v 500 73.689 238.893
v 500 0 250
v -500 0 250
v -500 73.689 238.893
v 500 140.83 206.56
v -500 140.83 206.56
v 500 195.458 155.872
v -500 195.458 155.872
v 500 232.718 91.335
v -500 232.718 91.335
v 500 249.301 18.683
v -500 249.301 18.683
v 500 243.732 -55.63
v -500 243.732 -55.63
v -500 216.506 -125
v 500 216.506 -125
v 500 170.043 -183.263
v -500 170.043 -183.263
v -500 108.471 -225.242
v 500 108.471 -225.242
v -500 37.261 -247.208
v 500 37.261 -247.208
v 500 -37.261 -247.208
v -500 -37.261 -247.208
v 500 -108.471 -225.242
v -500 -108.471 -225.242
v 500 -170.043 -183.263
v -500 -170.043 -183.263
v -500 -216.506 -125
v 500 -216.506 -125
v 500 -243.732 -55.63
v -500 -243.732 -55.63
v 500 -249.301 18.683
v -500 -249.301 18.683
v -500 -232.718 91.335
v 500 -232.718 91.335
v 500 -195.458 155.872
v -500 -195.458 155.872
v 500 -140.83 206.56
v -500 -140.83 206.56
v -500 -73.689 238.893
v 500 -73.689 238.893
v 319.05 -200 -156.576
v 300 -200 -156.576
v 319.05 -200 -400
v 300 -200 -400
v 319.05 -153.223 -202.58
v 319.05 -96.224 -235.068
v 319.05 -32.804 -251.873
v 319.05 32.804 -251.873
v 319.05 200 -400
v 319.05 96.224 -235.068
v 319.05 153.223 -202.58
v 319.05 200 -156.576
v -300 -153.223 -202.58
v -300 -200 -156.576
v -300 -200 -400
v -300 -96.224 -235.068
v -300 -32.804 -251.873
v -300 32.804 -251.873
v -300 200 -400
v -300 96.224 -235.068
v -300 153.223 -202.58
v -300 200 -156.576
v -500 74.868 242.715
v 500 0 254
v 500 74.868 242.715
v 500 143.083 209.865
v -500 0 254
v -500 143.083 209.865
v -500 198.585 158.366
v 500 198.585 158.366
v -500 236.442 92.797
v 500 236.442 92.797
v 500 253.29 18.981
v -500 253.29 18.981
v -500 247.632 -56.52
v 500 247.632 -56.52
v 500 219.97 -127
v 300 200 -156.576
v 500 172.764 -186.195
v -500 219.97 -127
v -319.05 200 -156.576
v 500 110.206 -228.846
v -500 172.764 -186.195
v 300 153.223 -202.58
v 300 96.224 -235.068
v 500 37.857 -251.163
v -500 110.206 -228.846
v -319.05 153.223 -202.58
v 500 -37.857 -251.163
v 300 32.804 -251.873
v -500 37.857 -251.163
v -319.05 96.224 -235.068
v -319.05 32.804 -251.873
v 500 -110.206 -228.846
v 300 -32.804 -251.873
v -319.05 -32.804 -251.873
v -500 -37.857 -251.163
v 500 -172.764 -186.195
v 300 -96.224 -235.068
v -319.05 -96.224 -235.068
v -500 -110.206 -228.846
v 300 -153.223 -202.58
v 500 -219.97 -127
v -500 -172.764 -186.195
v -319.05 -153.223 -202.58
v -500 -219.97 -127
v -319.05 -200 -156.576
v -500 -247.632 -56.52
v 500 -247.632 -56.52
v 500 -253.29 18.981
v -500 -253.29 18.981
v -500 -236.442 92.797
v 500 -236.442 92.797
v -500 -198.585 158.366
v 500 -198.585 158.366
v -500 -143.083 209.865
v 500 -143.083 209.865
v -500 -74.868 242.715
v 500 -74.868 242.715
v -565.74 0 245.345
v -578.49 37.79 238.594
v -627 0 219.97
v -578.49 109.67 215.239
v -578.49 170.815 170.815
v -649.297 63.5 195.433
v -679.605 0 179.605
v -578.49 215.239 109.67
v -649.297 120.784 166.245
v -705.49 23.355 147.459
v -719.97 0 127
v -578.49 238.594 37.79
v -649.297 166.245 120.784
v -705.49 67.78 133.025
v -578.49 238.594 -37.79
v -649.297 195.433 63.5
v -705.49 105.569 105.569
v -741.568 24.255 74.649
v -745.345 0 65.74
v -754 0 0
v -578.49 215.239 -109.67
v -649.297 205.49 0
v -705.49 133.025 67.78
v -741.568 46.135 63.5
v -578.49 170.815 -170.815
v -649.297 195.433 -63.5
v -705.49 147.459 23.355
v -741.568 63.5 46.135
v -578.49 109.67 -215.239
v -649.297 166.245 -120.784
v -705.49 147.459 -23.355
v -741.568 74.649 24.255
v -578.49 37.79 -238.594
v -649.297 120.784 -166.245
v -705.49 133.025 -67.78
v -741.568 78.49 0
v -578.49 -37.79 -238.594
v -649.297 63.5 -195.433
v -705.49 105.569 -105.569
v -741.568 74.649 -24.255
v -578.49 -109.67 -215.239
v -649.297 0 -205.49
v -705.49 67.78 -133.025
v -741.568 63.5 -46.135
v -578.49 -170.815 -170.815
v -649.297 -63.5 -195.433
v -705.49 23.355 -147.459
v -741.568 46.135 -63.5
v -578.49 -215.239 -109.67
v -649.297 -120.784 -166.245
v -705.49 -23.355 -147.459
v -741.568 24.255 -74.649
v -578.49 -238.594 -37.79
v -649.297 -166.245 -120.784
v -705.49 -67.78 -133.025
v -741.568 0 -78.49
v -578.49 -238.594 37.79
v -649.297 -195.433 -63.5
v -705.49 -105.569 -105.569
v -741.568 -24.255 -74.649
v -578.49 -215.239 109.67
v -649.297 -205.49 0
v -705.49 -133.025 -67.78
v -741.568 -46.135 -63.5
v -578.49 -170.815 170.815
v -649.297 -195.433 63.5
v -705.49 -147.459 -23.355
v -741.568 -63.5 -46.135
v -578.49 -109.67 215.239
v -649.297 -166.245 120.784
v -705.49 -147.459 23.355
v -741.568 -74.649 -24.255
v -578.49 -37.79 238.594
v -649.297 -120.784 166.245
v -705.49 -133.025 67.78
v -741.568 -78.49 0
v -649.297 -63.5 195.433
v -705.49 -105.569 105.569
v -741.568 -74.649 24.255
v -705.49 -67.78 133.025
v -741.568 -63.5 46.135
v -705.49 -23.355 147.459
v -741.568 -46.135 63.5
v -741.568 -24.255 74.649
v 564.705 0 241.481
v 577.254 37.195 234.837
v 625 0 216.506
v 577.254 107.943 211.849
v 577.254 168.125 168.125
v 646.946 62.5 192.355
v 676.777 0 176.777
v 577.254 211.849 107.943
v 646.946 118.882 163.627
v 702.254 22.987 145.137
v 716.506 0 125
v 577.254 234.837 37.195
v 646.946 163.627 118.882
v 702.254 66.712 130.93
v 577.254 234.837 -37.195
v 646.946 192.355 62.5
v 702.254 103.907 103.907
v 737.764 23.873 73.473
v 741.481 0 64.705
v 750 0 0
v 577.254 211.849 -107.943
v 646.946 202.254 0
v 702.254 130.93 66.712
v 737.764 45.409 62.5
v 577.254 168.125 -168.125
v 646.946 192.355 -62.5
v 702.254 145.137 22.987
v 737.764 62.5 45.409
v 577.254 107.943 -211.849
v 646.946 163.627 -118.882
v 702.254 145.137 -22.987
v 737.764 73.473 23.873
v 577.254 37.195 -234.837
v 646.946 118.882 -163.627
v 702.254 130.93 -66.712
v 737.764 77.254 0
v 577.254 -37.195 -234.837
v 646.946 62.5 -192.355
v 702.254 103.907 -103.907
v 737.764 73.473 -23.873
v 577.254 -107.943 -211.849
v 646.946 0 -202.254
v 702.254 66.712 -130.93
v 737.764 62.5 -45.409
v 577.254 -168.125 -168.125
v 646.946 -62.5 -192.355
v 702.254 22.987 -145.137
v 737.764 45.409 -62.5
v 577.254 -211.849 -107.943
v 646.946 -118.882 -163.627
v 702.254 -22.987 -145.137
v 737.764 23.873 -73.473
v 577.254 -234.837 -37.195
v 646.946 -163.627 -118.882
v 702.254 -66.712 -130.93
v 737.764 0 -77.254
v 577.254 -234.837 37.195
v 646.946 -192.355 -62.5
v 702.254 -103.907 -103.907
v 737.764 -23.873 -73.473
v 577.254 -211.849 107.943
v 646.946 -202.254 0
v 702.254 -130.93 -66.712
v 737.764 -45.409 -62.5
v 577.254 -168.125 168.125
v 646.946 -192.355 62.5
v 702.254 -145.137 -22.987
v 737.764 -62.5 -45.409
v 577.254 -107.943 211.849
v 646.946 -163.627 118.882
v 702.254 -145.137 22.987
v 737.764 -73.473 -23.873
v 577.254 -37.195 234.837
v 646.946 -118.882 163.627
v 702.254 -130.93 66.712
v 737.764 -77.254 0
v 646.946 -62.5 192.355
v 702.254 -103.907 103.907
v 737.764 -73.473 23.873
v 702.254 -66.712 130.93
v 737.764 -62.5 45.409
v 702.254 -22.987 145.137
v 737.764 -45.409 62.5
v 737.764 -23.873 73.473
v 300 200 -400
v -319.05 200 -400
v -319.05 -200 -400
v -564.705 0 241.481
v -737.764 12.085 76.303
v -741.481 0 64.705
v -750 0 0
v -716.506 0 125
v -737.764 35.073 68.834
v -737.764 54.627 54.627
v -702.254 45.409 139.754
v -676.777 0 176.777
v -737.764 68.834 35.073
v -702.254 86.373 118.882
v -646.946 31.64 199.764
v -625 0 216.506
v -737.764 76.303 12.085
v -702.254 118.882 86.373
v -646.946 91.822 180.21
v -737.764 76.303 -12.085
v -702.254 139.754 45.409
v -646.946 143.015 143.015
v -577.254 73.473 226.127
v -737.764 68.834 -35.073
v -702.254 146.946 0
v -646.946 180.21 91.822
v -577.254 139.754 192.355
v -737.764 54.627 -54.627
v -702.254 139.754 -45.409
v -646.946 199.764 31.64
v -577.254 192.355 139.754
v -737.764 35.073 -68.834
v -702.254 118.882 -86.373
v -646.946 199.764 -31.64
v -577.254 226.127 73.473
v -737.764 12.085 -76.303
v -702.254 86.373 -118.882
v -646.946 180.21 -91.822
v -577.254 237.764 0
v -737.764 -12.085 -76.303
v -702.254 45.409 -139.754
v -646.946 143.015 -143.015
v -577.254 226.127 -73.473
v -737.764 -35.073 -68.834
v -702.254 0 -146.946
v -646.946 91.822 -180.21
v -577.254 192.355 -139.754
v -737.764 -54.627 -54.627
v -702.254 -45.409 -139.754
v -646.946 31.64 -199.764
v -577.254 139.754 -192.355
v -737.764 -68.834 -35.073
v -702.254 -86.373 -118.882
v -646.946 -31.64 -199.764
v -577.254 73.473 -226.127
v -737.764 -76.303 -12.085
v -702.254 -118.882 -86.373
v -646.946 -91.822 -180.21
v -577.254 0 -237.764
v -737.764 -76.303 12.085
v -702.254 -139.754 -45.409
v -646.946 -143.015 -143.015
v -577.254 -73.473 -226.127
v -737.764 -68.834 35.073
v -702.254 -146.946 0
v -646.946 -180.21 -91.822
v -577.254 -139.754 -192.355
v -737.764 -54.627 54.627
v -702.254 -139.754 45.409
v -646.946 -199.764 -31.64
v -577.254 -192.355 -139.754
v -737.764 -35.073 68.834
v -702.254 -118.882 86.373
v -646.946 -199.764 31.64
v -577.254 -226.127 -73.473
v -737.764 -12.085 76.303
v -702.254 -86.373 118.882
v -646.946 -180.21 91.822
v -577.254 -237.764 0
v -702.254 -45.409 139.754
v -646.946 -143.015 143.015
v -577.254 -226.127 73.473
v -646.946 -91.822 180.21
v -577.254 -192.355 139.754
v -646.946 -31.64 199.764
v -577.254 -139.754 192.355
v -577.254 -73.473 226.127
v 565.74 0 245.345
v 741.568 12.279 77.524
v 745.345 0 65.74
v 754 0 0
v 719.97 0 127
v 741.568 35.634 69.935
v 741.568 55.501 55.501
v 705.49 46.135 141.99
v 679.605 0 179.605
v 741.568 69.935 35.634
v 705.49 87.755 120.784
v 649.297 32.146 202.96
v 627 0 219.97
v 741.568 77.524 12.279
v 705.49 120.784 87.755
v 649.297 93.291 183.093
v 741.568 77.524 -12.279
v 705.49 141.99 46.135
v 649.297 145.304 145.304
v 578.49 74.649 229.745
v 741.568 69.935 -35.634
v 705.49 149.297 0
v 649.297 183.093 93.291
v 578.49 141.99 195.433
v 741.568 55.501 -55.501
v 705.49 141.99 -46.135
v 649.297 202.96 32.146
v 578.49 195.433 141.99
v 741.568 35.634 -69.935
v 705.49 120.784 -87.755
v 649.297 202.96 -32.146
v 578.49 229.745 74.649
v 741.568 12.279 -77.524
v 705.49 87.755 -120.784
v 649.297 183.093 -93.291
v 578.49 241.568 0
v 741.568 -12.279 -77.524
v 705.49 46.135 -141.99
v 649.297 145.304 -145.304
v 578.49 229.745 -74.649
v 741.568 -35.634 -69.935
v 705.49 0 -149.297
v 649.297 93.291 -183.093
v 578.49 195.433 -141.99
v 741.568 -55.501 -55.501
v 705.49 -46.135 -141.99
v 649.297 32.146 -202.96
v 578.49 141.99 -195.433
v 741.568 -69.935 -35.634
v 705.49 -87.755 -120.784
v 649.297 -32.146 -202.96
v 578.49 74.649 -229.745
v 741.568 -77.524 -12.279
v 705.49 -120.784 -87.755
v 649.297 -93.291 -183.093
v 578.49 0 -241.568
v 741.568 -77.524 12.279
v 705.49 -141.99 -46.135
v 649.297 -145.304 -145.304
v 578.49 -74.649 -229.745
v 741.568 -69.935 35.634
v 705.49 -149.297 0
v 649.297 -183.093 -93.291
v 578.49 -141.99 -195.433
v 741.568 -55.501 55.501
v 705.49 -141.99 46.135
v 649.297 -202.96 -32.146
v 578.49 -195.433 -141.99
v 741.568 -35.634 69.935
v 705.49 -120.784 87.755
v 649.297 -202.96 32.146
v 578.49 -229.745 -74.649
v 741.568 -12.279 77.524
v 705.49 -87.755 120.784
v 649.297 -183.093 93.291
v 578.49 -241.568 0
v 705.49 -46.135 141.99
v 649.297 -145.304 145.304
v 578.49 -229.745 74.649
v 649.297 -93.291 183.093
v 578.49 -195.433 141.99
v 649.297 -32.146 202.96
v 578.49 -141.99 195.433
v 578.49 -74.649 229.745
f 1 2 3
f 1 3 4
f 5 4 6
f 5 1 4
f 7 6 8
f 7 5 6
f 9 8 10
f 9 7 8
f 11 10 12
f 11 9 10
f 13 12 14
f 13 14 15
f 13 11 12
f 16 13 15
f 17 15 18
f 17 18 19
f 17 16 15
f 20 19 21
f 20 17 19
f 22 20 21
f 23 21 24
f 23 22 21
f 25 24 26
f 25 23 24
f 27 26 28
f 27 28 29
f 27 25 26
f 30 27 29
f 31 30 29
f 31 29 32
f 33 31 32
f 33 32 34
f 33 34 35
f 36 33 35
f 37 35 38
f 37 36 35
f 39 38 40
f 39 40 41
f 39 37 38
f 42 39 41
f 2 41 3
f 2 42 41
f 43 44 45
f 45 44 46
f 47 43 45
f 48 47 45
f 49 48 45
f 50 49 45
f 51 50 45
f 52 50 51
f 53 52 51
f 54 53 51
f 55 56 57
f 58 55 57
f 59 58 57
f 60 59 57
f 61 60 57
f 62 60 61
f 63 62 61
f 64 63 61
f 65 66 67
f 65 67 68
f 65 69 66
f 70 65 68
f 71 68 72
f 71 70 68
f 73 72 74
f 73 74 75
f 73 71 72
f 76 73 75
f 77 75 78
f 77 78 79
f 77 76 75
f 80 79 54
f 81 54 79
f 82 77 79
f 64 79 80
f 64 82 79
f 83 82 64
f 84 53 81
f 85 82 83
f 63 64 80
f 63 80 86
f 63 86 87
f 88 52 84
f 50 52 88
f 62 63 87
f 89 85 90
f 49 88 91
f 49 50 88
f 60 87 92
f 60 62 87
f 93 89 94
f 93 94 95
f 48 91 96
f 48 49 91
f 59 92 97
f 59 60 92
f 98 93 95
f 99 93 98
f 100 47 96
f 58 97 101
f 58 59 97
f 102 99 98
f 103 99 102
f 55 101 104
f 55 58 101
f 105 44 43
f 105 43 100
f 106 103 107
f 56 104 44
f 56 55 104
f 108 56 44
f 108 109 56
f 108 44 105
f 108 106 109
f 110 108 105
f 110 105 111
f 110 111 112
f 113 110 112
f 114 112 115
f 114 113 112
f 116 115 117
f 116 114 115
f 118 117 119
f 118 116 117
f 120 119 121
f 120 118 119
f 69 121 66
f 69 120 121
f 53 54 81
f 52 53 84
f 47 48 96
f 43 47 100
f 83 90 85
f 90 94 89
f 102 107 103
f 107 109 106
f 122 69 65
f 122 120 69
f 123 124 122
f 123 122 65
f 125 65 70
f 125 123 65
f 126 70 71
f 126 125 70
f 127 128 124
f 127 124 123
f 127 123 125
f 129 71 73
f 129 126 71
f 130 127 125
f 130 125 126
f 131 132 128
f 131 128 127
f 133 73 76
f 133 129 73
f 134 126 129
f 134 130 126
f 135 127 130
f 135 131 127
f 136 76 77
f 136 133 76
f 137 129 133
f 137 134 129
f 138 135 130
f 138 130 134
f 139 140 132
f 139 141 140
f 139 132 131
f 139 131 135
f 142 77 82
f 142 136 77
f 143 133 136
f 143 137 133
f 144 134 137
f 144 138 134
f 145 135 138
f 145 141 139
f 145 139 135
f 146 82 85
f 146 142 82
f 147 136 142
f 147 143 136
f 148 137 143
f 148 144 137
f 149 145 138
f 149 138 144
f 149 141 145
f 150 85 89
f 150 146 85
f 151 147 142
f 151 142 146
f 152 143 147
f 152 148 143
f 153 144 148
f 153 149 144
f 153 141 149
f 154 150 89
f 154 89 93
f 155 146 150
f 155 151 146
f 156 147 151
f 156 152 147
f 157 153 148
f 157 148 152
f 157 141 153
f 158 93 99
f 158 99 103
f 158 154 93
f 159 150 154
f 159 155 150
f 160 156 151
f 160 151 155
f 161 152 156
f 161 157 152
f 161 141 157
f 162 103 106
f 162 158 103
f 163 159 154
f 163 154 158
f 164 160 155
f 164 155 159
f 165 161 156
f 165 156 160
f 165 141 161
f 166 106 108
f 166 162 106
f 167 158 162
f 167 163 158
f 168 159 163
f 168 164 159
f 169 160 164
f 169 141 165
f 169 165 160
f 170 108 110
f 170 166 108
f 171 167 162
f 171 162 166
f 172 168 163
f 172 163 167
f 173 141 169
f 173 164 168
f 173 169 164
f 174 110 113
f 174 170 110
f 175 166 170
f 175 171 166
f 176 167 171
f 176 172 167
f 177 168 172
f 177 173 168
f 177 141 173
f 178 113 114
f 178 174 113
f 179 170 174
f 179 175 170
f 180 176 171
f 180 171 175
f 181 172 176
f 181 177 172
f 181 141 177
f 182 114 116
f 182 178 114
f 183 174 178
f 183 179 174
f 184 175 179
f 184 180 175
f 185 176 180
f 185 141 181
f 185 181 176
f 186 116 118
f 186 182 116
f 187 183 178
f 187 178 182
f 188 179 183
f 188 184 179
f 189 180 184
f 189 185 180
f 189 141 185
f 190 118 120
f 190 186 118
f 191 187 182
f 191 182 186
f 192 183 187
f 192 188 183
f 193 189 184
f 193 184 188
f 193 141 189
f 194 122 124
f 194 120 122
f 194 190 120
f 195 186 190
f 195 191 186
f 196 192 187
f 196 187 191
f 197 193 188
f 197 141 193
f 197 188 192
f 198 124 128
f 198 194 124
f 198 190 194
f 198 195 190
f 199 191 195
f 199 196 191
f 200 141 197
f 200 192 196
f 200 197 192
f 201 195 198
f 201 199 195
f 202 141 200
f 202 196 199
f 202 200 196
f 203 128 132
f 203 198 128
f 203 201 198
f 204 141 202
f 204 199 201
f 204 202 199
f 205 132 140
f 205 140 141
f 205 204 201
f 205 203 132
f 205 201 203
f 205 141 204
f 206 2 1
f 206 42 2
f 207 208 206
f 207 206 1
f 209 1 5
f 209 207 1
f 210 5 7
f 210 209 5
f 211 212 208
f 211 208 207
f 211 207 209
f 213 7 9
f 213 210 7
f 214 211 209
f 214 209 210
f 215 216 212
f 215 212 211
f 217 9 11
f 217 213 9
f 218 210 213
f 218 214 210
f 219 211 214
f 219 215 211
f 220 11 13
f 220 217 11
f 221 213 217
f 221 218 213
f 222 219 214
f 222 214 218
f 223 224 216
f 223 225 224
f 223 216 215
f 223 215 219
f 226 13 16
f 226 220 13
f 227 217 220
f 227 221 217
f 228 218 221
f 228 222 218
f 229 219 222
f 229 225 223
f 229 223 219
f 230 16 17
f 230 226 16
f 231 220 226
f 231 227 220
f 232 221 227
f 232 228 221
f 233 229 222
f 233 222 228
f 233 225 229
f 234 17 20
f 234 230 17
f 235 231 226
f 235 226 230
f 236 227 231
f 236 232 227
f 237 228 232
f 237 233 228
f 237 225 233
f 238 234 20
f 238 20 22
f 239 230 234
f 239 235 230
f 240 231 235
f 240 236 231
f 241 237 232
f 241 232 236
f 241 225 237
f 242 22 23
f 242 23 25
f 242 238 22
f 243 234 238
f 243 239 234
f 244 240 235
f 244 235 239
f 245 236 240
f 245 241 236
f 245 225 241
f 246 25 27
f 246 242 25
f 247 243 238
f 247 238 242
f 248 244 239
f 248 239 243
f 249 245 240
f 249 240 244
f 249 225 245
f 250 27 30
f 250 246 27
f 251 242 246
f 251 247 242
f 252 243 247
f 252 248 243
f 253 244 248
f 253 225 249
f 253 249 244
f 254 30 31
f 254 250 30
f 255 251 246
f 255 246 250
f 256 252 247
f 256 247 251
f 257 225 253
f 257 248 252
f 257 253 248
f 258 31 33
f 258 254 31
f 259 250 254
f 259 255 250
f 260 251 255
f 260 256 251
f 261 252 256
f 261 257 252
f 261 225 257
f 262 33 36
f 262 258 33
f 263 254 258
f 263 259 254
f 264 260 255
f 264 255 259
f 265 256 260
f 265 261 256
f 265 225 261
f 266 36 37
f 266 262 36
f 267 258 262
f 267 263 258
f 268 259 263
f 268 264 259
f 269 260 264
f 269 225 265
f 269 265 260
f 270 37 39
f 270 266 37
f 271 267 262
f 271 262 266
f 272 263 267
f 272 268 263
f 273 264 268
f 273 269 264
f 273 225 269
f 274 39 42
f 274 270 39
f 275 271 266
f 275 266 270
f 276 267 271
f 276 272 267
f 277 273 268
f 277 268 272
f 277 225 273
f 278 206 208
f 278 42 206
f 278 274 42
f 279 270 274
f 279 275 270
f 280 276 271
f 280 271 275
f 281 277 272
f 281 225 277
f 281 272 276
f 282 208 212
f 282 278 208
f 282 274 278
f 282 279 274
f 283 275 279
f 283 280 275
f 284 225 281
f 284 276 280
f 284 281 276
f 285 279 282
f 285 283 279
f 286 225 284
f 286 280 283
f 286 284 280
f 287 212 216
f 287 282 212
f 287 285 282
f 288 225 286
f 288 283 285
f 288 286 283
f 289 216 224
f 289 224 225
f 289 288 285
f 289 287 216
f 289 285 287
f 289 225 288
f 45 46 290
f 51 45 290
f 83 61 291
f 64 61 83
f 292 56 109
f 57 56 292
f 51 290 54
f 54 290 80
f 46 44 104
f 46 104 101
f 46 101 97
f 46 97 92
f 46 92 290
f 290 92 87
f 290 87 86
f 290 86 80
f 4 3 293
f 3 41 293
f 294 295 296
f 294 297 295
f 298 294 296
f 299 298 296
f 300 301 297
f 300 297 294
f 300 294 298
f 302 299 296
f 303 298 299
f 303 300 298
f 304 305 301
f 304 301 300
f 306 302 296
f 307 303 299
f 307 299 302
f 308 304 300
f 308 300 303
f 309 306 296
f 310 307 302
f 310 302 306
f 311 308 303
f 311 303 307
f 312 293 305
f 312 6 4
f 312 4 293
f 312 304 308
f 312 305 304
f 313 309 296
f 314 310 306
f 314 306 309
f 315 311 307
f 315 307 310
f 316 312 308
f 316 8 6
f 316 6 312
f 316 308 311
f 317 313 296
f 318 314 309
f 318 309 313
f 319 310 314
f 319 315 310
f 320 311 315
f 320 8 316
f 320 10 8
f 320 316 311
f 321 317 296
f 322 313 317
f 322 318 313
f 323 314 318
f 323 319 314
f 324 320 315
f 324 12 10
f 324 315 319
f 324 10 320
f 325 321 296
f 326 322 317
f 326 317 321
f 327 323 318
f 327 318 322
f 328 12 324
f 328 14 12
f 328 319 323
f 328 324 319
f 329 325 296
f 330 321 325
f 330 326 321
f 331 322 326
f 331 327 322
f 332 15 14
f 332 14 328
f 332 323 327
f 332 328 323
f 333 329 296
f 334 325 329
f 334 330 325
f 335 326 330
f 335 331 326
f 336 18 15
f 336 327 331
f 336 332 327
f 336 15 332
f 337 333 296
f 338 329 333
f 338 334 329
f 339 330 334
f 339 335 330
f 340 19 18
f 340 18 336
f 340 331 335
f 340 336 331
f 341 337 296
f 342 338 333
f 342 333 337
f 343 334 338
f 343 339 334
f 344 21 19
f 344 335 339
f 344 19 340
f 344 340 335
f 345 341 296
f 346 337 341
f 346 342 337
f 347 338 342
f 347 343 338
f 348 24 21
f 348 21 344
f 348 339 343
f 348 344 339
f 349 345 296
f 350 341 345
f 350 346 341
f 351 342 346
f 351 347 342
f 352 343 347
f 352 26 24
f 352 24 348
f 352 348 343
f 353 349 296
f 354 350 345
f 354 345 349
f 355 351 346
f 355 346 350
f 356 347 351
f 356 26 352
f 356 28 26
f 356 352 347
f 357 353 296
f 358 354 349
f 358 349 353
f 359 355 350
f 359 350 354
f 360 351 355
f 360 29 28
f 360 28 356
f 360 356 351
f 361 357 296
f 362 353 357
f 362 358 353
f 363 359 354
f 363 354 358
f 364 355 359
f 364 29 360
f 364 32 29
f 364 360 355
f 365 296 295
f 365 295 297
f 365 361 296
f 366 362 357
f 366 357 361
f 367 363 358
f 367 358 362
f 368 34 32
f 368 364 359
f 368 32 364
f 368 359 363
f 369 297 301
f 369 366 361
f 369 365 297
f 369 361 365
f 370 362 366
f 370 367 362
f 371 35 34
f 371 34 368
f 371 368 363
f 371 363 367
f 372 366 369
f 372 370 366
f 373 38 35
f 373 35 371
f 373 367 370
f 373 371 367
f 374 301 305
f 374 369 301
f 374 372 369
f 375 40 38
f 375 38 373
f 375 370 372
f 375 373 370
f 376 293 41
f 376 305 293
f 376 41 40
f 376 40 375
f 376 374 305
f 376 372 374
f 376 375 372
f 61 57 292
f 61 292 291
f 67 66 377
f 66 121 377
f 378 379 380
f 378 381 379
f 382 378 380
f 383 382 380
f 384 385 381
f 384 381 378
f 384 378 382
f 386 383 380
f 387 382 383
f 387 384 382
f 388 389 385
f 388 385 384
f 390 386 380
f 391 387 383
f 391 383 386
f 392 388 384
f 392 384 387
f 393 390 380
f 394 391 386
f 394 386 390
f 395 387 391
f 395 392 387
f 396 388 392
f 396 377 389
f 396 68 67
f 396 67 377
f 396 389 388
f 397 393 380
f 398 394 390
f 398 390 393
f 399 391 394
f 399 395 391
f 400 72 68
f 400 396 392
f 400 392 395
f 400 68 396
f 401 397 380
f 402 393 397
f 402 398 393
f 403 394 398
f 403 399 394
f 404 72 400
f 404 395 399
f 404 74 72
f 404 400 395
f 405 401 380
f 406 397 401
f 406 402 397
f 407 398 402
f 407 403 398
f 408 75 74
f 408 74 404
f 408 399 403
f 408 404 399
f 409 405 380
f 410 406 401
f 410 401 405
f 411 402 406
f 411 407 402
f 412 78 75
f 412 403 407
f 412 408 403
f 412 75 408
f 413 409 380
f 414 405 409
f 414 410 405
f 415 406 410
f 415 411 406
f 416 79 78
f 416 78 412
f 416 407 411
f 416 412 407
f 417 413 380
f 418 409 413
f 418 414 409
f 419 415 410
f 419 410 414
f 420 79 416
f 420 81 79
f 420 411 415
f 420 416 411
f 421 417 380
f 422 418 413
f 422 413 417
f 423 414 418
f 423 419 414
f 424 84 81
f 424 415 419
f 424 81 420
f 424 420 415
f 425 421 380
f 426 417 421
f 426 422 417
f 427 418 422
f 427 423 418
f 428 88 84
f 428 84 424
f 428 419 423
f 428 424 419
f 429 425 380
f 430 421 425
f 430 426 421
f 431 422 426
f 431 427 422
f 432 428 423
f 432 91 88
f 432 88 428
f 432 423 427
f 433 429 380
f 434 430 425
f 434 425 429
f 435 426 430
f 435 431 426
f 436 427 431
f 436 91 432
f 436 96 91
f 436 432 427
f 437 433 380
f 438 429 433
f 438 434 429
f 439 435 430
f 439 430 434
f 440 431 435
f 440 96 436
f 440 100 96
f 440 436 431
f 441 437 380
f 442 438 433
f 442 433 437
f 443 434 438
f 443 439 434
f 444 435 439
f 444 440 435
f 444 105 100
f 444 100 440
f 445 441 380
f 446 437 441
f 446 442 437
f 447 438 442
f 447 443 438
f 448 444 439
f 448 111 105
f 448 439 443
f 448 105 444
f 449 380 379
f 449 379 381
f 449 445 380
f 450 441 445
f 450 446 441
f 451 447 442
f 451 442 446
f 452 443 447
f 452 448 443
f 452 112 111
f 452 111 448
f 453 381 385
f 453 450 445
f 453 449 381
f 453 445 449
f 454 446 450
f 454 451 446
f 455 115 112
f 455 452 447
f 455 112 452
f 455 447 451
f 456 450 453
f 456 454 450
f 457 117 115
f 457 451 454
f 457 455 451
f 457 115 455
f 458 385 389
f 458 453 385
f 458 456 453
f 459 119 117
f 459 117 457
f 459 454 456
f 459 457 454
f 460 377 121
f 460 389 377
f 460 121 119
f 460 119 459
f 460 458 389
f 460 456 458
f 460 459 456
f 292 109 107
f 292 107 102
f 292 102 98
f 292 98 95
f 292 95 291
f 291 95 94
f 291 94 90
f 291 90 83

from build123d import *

# Parameters (mm, degrees)
F4_DEPTH = 19.05


# Not quite as in the source:
# - a length typed as a fraction of an inch, garbled in the dataset ("3 / 203.2 mm" for 3/8 in), is restored


with BuildPart() as f1:
    # F0 (on Front) → F1 (revolve)
    with BuildSketch(Plane.XZ):
        with BuildLine():
            Line((-754, 0), (-750, 0))
            ThreePointArc((-750, 0), (-676.7766952966, 176.7766952966), (-500, 250))
            Line((-500, 250), (0, 250))
            Line((0, 250), (500, 250))
            ThreePointArc((500, 250), (676.7766952966, 176.7766952966), (750, 0))
            Line((750, 0), (754, 0))
            ThreePointArc((754, 0), (679.6051224214, 179.6051224214), (500, 254))
            Line((500, 254), (0, 254))
            Line((0, 254), (-500, 254))
            ThreePointArc((-500, 254), (-679.6051224214, 179.6051224214), (-754, 0))
        make_face()
    revolve(axis=Axis((-250, 0, 0), (-1, 0, 0)))

    # F3 (on offset) → F4 (join)
    with BuildSketch(Plane.YZ.offset(300)):
        with BuildLine():
            ThreePointArc((200, -156.5758602084), (0, -254), (-200, -156.5758602084))
            Line((-200, -156.5758602084), (-200, -400))
            Line((-200, -400), (200, -400))
            Line((200, -400), (200, -156.5758602084))
        make_face()
    extrude(amount=F4_DEPTH)

    # F5: F1 across plane


with BuildPart() as f1_1:
    add(f1.part)
    add(f1.part.mirror(Plane.YZ))


solid = f1_1.part
